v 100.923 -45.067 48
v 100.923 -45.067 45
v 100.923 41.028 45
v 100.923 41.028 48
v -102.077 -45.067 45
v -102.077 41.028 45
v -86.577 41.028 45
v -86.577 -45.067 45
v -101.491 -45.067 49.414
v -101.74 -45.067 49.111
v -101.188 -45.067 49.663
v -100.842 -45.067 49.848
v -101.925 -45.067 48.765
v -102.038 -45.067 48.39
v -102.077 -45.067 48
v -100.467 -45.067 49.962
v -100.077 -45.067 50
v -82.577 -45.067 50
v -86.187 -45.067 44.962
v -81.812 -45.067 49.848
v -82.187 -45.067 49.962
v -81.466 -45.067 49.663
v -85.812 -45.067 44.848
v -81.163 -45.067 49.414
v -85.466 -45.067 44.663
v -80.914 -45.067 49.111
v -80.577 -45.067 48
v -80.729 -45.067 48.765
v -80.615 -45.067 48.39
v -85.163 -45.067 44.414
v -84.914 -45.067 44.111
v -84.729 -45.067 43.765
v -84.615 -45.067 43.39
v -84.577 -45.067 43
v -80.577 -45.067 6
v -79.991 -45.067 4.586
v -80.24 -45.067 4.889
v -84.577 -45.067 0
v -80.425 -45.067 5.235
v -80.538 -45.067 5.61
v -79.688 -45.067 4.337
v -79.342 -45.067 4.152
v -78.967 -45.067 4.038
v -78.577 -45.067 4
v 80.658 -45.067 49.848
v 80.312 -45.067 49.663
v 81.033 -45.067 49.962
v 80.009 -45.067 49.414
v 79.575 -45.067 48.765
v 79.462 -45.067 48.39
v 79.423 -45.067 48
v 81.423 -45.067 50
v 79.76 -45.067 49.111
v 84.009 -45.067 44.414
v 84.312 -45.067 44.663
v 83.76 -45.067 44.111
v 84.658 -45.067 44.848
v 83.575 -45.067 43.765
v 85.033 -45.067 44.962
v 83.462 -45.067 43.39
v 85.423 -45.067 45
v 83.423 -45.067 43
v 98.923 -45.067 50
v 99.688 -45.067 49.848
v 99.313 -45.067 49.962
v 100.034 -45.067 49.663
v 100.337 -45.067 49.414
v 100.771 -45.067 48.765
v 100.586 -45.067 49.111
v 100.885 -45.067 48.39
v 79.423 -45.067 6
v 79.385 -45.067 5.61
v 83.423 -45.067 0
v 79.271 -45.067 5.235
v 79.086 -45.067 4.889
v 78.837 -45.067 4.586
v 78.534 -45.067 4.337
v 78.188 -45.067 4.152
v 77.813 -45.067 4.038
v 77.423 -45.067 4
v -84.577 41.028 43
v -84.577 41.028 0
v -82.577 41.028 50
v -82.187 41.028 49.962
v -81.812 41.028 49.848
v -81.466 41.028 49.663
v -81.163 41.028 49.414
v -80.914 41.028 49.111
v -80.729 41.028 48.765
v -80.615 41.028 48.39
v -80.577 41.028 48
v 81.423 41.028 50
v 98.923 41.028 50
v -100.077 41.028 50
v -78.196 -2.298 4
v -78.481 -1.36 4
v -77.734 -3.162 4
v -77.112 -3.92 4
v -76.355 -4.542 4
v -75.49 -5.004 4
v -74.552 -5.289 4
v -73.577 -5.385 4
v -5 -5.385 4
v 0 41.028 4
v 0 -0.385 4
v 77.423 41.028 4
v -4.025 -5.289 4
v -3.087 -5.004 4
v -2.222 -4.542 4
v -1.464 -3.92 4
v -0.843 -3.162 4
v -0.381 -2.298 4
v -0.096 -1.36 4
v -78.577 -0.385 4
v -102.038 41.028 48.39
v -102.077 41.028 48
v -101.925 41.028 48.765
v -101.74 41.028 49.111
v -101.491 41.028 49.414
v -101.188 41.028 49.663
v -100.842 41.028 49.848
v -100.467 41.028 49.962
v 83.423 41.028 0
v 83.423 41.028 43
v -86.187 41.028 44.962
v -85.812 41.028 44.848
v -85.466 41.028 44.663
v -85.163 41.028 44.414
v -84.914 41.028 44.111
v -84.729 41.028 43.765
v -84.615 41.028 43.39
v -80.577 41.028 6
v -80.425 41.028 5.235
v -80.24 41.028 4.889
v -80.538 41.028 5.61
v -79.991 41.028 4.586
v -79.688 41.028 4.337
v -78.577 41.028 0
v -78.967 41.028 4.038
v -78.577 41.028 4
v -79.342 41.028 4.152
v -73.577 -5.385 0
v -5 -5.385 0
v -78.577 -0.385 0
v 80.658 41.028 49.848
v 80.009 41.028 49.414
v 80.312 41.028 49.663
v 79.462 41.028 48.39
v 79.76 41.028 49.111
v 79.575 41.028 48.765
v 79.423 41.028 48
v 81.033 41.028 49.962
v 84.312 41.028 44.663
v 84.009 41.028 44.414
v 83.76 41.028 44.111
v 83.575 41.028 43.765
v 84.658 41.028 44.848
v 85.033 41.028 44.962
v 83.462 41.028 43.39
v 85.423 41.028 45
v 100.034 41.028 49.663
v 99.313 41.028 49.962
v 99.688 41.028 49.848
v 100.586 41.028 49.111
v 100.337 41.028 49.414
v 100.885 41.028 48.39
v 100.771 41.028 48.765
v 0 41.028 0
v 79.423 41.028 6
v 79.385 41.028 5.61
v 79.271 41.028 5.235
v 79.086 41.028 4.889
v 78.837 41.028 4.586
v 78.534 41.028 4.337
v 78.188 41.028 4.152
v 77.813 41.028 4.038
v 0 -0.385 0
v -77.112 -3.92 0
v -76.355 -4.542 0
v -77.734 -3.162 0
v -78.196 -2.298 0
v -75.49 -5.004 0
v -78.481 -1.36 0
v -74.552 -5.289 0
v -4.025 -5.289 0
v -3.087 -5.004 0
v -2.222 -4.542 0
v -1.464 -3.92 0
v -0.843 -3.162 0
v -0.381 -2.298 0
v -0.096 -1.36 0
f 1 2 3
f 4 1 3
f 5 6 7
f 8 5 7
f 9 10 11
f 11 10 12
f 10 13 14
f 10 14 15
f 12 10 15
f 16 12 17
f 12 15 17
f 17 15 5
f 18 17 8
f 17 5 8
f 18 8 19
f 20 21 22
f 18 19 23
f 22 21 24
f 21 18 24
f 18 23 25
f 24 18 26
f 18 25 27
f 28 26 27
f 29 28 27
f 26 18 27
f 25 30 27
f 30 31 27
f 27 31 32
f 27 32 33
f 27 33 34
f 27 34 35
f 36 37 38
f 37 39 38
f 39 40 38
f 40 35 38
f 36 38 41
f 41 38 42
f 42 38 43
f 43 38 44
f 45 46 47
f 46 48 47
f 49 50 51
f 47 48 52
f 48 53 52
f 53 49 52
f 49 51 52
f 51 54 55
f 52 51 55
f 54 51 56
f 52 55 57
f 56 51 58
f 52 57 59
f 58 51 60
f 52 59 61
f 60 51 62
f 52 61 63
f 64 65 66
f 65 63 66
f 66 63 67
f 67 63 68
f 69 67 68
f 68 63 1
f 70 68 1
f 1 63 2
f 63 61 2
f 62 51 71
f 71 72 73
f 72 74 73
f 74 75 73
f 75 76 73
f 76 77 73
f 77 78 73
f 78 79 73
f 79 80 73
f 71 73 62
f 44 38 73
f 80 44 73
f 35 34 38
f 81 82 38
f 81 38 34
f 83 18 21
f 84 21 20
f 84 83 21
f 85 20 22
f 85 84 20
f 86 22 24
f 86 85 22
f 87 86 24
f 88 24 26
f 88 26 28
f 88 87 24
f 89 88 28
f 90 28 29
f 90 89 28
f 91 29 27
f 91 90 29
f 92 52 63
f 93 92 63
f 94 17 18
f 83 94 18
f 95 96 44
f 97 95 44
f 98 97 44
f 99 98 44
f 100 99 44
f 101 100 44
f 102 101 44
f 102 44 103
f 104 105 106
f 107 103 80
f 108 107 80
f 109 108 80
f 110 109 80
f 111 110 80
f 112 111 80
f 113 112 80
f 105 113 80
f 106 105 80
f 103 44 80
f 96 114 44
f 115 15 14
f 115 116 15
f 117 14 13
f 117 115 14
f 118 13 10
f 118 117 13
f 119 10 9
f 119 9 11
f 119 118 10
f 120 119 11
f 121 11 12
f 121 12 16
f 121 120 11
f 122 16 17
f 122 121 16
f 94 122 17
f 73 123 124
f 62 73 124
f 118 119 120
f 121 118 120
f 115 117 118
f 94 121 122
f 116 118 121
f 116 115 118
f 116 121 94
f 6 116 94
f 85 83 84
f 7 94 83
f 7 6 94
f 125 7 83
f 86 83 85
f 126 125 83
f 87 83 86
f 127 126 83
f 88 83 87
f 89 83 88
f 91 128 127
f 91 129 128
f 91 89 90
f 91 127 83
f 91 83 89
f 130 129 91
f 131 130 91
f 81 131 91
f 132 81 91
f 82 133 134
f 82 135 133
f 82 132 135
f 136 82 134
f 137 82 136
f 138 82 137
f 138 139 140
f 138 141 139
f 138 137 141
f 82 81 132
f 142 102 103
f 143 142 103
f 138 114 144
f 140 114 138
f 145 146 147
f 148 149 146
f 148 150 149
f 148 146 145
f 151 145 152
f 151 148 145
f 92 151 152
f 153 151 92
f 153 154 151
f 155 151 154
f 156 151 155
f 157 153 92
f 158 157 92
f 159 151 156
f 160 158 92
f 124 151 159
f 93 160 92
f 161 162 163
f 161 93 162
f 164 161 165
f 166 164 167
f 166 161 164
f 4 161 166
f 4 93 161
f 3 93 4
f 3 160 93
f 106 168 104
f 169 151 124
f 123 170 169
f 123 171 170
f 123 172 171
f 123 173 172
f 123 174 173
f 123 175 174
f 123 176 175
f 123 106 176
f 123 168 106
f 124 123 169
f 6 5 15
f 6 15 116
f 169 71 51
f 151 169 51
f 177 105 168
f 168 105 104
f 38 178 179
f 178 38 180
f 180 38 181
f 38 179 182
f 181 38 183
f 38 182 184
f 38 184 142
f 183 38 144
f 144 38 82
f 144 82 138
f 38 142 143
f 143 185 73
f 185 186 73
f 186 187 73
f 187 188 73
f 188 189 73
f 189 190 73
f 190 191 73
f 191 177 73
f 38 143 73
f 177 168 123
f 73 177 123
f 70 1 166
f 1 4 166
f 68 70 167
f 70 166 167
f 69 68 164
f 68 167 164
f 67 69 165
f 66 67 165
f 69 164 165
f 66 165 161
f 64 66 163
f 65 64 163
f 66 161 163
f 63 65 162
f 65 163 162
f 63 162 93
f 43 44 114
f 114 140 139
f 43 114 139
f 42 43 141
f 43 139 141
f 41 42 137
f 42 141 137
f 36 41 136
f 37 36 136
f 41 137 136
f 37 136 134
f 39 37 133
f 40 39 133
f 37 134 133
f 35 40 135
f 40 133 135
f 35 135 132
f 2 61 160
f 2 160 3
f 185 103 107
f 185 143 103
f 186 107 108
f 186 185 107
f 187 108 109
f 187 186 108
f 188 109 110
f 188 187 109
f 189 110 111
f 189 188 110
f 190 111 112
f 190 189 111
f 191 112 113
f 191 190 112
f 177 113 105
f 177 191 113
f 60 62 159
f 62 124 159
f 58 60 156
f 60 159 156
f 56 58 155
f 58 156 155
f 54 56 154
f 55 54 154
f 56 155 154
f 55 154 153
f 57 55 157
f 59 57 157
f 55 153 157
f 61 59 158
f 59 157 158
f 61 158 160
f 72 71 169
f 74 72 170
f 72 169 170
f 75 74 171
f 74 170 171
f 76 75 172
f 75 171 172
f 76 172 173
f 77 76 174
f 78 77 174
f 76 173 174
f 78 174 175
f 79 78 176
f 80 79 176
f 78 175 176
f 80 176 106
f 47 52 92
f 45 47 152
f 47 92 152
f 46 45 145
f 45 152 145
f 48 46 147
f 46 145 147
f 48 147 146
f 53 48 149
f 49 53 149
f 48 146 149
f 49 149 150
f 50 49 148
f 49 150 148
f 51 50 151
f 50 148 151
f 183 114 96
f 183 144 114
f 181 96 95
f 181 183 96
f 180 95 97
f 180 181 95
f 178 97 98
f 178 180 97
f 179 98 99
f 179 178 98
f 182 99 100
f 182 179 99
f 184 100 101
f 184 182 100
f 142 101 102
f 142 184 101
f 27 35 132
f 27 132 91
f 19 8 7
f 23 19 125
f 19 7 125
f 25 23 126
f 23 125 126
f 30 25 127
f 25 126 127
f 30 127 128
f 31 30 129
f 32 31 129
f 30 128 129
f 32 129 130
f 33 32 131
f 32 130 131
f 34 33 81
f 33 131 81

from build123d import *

# Parameters (mm, degrees)
F0_W      = 203
F0_H      = 86.0950331151
F1_DEPTH  = 50
F2_W      = 17.5
F2_H      = 45
F3_DEPTH  = 86.0960331151
F4_W      = 17.5
F4_H      = 45
F5_DEPTH  = 86.0960331151
F6_W      = 160
F6_H      = 46
F7_DEPTH  = 86.0960331151
F8_R      = 2
F9_W      = 78.5769208074
F9_H      = 46.412901438
F10_DEPTH = 25
F11_R     = 5


with BuildPart() as f1:
    # F0 (on Top) → F1 (new body)
    with BuildSketch(Plane.XY):
        with Locations((-0.5769208074, -2.0192312077)):
            Rectangle(F0_W, F0_H)
    extrude(amount=F1_DEPTH)

    # F2 (on face) → F3 (cut, through all)
    with BuildSketch(Plane.XZ.offset(45.0667477652)):
        with Locations((-93.3269208074, 22.5)):
            Rectangle(F2_W, F2_H)
    extrude(amount=-F3_DEPTH, mode=Mode.SUBTRACT)

    # F4 (on face) → F5 (cut, through all)
    with BuildSketch(Plane.XZ.offset(45.0667477652)):
        with Locations((92.1730791926, 22.5)):
            Rectangle(F4_W, F4_H)
    extrude(amount=-F5_DEPTH, mode=Mode.SUBTRACT)

    # F6 (on face) → F7 (cut, through all)
    with BuildSketch(Plane.XZ.offset(45.0667477652)):
        with Locations((-0.5769208074, 27)):
            Rectangle(F6_W, F6_H)
    extrude(amount=-F7_DEPTH, mode=Mode.SUBTRACT)

    # F8
    f8_edges = [f1.edges().sort_by_distance(p)[0] for p in [
        (79.423079, -2.019231, 50),
        (-80.576921, -2.019231, 50),
        (-84.576921, -2.019231, 45),
        (83.423079, -2.019231, 45),
        (79.423079, -2.019231, 4),
        (-80.576921, -2.019231, 4),
        (100.923079, -2.019231, 50),
        (-102.076921, -2.019231, 50),
    ]]
    fillet(f8_edges, radius=F8_R)

    # F9 (on face) → F10 (cut)
    with BuildSketch(Plane.XY.offset(4)):
        with Locations((-39.2884604037, 17.8218346309)):
            Rectangle(F9_W, F9_H)
    extrude(amount=-F10_DEPTH, mode=Mode.SUBTRACT)

    # F11
    f11_edges = [f1.edges().sort_by_distance(p)[0] for p in [
        (0, -5.384616, 2),
        (-78.576921, -5.384616, 2),
    ]]
    fillet(f11_edges, radius=F11_R)


solid = f1.part
